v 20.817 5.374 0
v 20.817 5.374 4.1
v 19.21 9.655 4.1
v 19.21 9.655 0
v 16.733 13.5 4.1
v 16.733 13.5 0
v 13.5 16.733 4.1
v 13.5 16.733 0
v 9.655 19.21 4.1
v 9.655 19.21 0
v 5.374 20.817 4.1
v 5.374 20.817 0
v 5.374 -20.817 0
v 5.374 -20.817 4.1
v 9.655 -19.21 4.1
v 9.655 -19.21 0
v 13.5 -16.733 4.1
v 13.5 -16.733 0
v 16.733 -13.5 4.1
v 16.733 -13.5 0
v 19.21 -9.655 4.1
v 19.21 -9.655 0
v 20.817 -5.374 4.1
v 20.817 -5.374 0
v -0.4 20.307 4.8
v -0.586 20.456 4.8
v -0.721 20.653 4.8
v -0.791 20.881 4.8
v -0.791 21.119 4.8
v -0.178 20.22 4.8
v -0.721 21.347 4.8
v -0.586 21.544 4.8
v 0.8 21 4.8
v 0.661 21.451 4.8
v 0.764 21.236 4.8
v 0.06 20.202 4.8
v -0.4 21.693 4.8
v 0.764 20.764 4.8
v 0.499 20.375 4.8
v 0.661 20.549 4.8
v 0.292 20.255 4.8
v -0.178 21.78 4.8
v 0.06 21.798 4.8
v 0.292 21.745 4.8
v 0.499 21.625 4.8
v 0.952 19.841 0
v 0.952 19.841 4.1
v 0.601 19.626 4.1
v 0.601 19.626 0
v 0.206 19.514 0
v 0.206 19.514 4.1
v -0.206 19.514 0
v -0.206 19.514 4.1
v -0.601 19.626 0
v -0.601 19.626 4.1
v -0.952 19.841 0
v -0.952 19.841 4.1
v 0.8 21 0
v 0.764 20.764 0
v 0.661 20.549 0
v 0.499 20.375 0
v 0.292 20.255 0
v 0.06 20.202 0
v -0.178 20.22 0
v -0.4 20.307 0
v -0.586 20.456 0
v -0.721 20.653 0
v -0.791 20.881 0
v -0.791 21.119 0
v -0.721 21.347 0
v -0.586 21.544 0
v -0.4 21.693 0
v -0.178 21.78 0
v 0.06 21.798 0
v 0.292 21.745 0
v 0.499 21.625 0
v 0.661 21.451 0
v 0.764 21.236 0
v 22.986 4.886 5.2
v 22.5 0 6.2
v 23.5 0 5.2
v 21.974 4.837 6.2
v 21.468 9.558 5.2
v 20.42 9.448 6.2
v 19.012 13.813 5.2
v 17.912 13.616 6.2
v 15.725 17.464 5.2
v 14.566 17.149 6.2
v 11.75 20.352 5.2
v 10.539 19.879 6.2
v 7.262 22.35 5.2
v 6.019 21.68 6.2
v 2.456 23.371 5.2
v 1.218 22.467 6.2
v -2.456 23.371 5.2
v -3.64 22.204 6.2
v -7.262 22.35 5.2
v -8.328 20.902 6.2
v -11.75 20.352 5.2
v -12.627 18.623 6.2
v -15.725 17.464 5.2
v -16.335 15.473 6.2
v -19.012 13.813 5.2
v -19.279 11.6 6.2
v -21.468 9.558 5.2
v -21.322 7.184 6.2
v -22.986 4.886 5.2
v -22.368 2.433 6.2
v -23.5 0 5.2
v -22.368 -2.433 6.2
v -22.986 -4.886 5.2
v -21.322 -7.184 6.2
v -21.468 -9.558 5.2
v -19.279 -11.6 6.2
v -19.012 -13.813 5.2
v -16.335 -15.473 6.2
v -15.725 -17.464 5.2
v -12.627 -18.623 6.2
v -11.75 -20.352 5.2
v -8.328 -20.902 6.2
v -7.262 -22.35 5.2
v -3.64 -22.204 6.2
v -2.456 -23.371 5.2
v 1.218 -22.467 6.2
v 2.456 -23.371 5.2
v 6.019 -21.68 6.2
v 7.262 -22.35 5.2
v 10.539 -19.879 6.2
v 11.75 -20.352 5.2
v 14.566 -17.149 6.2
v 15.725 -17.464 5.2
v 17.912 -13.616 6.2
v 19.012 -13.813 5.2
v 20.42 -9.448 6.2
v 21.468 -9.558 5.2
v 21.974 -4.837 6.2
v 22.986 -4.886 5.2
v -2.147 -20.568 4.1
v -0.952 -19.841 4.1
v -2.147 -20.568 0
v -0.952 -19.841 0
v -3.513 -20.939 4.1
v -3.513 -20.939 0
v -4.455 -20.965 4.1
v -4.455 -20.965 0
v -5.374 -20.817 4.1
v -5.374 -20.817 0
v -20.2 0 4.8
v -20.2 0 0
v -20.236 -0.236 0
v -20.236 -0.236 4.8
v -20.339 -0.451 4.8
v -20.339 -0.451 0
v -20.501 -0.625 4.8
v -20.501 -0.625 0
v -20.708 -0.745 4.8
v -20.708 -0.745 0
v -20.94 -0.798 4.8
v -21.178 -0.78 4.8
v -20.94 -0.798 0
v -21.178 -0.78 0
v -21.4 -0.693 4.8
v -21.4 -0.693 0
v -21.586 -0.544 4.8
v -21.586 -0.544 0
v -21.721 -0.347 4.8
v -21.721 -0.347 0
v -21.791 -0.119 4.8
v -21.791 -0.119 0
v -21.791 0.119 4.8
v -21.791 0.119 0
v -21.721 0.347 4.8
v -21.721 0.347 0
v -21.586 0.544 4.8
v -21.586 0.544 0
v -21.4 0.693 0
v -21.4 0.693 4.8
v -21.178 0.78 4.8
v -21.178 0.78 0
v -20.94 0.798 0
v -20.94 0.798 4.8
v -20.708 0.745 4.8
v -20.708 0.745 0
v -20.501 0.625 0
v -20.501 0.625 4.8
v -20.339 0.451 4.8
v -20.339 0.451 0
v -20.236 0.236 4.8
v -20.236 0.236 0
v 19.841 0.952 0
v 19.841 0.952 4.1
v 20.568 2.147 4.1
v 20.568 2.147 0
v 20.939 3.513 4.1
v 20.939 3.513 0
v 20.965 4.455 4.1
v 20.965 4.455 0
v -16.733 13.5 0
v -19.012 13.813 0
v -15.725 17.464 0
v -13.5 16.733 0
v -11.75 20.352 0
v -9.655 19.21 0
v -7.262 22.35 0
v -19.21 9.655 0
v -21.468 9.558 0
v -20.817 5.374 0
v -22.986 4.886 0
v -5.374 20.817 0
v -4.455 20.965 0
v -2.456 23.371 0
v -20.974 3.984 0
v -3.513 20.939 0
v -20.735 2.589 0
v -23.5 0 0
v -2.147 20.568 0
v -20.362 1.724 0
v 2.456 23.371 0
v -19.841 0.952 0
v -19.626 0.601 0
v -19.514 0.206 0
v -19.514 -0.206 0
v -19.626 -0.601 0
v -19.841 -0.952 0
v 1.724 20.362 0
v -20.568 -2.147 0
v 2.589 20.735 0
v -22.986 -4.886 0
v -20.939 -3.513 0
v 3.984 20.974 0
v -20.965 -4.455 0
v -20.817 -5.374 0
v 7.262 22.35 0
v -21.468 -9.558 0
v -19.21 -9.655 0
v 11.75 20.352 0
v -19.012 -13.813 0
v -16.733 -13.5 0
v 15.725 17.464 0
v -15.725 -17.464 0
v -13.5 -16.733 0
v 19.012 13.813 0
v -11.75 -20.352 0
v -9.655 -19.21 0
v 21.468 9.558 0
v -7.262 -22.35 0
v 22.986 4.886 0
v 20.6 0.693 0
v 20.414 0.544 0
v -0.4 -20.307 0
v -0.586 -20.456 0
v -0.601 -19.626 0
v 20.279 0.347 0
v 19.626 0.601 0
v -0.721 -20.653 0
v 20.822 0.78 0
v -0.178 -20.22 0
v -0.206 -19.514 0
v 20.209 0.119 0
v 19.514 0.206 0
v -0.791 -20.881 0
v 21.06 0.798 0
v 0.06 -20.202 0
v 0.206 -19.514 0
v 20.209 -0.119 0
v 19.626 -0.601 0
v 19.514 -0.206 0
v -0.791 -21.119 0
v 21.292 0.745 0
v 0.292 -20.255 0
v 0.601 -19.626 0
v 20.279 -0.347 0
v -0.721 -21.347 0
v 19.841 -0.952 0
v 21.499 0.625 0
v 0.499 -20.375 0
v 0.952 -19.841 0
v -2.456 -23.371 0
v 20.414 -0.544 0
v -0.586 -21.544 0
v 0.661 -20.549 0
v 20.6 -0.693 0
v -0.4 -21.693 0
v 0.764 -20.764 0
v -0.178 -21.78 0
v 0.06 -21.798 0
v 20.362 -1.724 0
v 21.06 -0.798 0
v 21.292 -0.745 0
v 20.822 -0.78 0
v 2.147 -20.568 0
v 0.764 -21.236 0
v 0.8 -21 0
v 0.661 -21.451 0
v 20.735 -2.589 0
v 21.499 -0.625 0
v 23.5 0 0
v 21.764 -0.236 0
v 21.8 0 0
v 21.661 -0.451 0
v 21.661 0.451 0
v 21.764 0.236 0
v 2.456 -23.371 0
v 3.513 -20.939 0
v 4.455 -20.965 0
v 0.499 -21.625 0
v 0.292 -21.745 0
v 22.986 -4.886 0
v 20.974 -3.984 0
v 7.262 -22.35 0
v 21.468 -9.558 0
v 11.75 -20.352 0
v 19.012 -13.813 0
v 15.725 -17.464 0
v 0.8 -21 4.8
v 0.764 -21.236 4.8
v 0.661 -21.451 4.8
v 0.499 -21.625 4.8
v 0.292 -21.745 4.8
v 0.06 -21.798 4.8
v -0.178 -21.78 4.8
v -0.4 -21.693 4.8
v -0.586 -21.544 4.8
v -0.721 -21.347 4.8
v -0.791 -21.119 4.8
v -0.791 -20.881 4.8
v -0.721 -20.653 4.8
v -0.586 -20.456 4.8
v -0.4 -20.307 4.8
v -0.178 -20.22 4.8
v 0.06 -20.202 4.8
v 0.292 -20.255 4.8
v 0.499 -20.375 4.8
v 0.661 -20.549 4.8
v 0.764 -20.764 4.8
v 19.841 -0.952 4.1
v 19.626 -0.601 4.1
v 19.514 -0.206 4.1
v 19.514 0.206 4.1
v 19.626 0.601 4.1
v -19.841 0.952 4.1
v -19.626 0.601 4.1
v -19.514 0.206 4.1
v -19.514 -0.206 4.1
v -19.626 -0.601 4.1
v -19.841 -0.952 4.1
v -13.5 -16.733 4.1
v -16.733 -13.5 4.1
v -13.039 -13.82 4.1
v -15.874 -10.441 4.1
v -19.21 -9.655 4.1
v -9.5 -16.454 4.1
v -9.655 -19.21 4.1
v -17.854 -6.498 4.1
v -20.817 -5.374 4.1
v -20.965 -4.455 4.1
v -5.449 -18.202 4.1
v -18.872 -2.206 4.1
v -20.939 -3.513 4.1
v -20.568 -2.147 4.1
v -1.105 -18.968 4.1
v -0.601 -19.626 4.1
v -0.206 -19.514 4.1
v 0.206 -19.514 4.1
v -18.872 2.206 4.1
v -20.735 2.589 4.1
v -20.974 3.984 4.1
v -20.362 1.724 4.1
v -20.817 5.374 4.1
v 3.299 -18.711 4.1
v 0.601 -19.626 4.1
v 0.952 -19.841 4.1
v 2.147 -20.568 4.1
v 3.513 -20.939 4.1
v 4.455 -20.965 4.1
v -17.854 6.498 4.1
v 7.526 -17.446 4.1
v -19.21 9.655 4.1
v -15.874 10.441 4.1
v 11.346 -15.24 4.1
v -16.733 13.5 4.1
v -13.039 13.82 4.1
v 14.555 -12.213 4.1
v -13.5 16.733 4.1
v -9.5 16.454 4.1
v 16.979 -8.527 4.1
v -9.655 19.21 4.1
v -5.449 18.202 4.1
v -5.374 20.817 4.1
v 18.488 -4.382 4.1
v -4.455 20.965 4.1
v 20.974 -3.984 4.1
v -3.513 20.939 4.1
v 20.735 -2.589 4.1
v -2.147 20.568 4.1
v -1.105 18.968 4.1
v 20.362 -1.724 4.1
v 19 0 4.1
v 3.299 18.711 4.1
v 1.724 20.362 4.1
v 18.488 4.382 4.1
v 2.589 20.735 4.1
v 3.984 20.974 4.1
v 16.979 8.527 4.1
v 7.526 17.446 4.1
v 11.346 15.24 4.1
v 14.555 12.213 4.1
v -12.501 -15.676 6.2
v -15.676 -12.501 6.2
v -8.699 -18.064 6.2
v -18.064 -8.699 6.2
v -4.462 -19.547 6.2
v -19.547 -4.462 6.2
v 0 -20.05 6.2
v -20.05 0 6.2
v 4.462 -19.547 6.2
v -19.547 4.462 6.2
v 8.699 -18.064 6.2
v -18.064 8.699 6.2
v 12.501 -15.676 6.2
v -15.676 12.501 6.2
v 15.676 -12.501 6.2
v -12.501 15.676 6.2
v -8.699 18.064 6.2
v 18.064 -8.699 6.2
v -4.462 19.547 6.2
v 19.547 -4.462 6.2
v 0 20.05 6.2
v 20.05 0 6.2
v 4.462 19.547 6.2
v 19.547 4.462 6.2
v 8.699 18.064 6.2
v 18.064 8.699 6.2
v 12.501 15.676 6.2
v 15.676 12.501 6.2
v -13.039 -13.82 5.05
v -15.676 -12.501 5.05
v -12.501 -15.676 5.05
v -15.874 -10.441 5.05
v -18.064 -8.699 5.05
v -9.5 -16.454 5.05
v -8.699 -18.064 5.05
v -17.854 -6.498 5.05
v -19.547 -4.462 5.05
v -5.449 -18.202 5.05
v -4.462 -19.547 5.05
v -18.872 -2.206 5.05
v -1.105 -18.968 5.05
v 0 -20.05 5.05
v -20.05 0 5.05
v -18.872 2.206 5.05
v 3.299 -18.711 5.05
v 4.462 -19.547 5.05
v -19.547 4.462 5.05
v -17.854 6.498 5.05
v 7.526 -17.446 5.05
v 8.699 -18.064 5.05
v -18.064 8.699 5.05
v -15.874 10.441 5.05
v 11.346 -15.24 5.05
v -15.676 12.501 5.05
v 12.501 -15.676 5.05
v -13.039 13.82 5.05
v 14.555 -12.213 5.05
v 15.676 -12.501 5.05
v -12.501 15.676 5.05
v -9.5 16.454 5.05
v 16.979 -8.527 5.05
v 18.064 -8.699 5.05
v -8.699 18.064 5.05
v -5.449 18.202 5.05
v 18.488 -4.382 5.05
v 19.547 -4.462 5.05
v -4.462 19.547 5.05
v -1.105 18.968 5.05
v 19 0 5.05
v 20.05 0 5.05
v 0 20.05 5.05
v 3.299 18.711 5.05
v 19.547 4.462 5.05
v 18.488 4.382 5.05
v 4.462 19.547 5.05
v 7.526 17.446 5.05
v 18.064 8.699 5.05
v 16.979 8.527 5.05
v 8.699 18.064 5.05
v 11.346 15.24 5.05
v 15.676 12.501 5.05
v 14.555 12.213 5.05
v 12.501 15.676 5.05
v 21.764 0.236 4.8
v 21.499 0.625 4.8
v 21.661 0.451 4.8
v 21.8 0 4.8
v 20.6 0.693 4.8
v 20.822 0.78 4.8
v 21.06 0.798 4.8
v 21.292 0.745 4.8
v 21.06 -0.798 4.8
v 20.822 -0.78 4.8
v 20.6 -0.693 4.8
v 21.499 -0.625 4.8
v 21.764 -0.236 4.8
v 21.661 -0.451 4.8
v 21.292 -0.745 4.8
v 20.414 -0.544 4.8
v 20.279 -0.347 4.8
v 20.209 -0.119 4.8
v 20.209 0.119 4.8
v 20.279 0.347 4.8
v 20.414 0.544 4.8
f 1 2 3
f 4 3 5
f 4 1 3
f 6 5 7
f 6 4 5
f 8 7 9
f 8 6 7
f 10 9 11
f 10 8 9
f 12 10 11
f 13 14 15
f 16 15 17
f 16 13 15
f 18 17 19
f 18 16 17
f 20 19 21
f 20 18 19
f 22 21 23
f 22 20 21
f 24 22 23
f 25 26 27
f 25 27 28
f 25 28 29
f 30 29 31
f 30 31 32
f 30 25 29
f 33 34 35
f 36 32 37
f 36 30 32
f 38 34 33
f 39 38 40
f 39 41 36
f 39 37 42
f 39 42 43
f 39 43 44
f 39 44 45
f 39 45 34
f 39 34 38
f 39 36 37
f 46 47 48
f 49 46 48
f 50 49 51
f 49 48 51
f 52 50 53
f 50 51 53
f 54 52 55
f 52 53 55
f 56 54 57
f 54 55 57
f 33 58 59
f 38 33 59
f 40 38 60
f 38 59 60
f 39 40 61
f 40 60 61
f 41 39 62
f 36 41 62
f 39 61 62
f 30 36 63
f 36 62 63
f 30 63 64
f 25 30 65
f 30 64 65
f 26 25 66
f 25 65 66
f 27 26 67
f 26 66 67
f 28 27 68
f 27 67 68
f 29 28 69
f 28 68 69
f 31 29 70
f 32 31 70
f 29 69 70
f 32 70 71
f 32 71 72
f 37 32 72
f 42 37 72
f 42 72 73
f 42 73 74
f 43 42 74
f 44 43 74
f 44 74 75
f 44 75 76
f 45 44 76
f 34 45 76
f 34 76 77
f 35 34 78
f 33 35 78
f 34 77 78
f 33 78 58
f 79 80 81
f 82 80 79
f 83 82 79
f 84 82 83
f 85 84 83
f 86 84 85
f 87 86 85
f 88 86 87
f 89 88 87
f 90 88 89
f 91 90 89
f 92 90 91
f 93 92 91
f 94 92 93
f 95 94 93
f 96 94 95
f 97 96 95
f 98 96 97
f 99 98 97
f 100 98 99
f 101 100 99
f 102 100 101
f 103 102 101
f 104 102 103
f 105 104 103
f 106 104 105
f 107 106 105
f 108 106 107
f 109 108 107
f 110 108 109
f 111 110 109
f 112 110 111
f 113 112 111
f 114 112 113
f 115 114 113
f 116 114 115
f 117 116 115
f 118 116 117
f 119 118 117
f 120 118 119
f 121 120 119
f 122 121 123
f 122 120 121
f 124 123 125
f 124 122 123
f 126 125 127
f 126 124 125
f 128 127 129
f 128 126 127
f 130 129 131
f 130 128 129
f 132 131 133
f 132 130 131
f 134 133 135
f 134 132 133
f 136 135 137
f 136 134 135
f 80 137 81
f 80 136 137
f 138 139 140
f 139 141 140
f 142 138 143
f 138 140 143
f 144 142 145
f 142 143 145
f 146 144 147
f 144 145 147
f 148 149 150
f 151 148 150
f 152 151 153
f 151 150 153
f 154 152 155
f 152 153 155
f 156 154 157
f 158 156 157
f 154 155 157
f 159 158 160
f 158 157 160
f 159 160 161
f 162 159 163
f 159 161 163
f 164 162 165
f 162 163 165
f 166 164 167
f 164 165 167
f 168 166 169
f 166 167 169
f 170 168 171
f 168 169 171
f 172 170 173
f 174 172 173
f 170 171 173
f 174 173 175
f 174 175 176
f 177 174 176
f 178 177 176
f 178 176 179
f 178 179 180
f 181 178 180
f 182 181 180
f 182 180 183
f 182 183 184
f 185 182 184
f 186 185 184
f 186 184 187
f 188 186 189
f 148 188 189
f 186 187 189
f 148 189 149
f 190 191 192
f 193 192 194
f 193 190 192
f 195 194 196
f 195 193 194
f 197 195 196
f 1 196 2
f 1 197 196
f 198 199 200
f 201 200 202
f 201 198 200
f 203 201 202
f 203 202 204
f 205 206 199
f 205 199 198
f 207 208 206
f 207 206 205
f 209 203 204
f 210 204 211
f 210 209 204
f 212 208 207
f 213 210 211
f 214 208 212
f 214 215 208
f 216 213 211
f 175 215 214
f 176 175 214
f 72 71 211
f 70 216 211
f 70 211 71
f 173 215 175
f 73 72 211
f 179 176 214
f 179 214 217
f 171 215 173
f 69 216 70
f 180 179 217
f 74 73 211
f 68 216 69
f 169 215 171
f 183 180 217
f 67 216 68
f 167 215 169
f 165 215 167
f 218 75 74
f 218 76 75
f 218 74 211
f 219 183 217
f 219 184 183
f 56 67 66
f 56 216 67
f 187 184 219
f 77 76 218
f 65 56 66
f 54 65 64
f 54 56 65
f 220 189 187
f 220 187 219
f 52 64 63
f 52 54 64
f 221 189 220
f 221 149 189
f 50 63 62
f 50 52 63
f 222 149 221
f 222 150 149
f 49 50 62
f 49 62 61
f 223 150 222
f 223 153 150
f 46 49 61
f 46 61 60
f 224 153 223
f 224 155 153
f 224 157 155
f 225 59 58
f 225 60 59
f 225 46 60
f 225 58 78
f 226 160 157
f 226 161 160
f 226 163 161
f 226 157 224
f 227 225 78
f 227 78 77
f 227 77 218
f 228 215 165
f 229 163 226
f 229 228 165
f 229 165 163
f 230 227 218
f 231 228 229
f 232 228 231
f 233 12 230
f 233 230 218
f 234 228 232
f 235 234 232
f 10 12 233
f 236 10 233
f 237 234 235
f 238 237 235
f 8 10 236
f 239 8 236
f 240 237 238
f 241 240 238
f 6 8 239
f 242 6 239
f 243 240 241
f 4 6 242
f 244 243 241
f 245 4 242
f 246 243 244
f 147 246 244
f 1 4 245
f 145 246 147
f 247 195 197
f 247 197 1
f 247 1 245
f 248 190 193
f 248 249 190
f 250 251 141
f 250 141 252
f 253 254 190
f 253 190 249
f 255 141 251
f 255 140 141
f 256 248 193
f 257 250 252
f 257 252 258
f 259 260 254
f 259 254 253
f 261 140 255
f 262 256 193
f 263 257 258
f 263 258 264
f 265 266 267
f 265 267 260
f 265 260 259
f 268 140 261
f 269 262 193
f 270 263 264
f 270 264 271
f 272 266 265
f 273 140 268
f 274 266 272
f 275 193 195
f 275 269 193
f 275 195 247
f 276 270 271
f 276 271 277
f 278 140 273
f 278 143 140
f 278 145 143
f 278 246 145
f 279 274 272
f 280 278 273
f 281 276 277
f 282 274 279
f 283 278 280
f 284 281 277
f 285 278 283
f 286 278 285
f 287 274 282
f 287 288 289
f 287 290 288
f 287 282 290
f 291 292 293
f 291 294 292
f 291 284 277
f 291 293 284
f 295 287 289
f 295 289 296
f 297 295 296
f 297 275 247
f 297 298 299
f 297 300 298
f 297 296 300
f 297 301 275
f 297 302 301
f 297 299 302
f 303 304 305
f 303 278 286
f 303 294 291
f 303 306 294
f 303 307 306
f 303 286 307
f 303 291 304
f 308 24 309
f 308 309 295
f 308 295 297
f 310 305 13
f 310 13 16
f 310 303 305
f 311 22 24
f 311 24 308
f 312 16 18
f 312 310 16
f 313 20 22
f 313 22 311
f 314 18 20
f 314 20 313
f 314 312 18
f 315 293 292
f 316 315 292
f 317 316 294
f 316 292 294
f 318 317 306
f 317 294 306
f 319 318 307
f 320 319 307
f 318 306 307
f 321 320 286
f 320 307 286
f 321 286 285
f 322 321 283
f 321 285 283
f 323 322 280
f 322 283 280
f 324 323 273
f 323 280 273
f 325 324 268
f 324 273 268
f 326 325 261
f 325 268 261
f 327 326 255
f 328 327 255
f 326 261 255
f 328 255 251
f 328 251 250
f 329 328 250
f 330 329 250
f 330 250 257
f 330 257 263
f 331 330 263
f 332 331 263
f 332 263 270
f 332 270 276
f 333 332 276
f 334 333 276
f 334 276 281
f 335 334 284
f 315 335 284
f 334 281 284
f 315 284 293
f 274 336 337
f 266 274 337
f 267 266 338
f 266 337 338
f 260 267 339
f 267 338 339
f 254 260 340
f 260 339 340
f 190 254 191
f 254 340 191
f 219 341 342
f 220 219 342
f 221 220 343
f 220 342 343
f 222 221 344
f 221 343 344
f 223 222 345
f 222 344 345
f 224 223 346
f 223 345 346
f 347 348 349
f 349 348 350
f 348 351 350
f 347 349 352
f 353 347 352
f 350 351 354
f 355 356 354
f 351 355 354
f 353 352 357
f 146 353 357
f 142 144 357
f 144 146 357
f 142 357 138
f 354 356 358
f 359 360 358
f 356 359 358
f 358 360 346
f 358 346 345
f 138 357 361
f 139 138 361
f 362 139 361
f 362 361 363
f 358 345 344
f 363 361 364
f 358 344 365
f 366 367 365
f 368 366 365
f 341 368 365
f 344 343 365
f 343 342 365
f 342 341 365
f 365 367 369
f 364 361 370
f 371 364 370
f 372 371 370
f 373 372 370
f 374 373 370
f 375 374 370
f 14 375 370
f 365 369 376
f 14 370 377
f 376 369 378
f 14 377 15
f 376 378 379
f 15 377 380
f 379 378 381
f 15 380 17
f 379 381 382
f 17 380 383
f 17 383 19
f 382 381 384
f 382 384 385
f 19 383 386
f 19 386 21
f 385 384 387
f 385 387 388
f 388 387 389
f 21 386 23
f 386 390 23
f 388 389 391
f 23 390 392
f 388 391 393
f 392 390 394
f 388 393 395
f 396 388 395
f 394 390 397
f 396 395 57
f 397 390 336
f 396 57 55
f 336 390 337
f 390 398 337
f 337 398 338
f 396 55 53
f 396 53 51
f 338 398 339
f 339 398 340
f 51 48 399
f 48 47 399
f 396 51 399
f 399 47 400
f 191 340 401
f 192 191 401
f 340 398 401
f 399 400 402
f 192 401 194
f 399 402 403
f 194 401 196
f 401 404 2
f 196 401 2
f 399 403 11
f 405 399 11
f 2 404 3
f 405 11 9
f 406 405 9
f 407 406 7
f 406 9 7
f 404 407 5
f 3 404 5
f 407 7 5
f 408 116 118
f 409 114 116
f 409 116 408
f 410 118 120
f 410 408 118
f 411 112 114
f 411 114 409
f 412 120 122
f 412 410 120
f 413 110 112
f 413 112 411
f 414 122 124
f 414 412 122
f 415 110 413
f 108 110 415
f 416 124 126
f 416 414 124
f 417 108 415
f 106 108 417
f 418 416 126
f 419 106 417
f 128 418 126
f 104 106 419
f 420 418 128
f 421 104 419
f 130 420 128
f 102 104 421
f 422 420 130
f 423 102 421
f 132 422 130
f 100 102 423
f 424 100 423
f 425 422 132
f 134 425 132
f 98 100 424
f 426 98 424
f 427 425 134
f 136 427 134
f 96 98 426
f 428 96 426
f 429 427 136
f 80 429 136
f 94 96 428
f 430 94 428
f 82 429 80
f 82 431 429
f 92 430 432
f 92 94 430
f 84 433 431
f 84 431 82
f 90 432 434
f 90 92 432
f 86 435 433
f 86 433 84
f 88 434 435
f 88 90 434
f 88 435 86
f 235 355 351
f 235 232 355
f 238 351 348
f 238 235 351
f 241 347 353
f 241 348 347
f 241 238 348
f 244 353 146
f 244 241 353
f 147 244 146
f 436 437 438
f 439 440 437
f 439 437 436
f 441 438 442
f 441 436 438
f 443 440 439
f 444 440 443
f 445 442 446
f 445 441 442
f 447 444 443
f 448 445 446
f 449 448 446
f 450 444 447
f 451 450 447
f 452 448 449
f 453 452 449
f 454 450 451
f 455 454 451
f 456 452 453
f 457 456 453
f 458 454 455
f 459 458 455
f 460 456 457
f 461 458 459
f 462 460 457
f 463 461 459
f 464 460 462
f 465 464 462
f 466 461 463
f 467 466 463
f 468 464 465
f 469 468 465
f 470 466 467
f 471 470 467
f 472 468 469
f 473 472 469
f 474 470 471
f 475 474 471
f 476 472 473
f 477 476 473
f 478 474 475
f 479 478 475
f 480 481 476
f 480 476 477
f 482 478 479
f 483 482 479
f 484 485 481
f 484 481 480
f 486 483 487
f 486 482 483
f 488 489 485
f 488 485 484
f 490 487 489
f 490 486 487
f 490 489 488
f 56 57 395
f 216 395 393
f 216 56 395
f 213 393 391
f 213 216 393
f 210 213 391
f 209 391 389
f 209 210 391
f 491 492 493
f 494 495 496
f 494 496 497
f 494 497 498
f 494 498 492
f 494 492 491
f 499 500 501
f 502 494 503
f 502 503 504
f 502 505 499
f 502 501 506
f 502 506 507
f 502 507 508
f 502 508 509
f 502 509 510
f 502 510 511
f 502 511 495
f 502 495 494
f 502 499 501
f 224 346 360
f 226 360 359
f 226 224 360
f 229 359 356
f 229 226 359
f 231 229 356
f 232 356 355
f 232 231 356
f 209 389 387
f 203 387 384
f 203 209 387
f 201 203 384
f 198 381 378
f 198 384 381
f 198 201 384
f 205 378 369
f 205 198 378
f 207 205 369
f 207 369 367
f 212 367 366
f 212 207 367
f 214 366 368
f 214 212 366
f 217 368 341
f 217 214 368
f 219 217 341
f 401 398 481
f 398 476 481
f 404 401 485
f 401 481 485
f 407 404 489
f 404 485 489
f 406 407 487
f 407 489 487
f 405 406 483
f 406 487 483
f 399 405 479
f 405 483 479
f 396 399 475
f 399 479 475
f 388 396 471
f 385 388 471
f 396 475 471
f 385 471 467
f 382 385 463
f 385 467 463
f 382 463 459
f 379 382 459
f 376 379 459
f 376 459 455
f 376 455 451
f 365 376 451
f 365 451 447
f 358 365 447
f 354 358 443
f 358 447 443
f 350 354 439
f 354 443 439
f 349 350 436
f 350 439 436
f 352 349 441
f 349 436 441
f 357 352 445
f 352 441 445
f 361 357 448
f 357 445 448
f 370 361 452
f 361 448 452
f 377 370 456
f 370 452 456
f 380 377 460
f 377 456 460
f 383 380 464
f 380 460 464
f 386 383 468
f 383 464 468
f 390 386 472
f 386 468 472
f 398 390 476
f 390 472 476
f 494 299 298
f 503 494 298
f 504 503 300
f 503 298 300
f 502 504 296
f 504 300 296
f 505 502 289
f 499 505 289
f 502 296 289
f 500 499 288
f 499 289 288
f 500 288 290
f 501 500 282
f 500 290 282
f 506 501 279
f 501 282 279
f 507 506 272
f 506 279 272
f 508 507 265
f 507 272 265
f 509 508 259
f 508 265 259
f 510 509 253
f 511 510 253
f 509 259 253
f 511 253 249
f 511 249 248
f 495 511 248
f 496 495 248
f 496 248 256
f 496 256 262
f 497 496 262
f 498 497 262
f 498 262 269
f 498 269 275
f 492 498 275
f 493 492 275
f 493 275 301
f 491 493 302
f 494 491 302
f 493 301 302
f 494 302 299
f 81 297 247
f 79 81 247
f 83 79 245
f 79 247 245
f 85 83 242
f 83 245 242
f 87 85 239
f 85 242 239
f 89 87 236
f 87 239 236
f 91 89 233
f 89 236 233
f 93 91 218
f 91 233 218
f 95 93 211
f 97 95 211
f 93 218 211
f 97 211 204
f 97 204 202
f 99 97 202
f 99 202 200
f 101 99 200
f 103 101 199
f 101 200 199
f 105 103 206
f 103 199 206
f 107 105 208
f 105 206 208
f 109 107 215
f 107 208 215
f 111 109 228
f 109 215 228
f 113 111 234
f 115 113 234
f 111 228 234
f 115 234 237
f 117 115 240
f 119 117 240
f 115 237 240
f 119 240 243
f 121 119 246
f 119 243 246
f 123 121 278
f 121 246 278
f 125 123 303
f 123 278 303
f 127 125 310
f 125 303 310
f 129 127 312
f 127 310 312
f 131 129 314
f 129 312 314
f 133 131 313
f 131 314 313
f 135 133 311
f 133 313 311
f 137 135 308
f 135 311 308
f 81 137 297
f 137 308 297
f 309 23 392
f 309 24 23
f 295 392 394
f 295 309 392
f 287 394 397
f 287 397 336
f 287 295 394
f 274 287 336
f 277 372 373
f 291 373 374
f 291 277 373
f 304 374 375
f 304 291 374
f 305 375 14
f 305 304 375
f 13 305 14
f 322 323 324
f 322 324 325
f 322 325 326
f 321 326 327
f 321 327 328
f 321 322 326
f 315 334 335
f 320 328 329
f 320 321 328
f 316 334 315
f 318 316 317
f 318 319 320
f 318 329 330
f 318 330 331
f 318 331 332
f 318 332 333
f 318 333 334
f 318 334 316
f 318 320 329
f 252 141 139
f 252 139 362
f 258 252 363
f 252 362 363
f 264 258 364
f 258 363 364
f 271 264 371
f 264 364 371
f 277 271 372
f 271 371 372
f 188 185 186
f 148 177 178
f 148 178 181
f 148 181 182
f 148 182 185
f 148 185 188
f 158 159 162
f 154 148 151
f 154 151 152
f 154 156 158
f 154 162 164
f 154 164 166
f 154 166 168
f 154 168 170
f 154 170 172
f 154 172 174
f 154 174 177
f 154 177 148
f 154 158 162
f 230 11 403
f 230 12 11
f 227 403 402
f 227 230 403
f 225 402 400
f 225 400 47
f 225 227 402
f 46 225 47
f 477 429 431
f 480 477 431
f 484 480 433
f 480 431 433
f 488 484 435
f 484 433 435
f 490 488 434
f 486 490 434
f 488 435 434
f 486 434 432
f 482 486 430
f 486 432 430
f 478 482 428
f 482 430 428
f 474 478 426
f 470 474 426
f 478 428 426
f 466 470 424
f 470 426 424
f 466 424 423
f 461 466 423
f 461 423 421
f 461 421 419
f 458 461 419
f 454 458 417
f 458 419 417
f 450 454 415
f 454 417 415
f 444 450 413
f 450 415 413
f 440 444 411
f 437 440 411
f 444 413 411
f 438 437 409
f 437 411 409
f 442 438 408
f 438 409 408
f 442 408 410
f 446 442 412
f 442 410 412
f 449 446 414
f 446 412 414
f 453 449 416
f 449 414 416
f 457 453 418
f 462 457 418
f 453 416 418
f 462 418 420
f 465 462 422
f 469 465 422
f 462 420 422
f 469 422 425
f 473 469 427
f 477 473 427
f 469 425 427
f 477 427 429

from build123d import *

# Parameters (mm, degrees)
F0_R      = 23.5
F1_DEPTH  = 6.2
F2_T      = -2
F3_SIZE   = 1
F4_R      = 19
F5_DEPTH  = 6.201
F6_R      = 20.05
F7_DEPTH  = 1.15
F8_DEPTH  = 0.1
F9_R      = 1.5
F10_DEPTH = 4.1
F11_R     = 5
F12_R     = 0.8
F13_DEPTH = 4.8


with BuildPart() as f1:
    # F0 (on Top) → F1 (new body)
    with BuildSketch(Plane.XY):
        Circle(F0_R)
    extrude(amount=F1_DEPTH)

    # F2
    f2_openings = [f1.faces().sort_by_distance(p)[0] for p in [
        (0, 0, 0),
    ]]
    offset(amount=F2_T, openings=f2_openings)

    # F3
    f3_edges = [f1.edges().sort_by_distance(p)[0] for p in [
        (-23.5, 0, 6.2),
    ]]
    chamfer(f3_edges, length=F3_SIZE)

    # F4 (on face) → F5 (cut, through all)
    with BuildSketch(Plane.XY.offset(6.2)):
        Circle(F4_R)
    extrude(amount=-F5_DEPTH, mode=Mode.SUBTRACT)

    # F6 (on face) → F7 (cut)
    with BuildSketch(Plane.XY.offset(6.2)):
        Circle(F6_R)
    extrude(amount=-F7_DEPTH, mode=Mode.SUBTRACT)

    # F8 (add): a face of the model
    f8_faces = [f1.faces().sort_by_distance(p)[0] for p in [
        (-20.8918881682, 0, 4.2),
    ]]
    extrude(f8_faces, amount=F8_DEPTH)

    # F9 (on face) → F10 (join, through all)
    with BuildSketch(Plane(origin=(0, 0, 4.1), x_dir=(1, 0, 0), z_dir=(0, 0, -1))):
        with Locations((0, 21)):
            Circle(F9_R)
        with Locations((-21, 0)):
            Circle(F9_R)
        with Locations((0, -21)):
            Circle(F9_R)
        with Locations((21, 0)):
            Circle(F9_R)
    extrude(amount=F10_DEPTH)

    # F11
    f11_edges = [f1.edges().sort_by_distance(p)[0] for p in [
        (21.452381, -1.430158, 2.05),
        (21.452381, 1.430158, 2.05),
        (-1.430158, -21.452381, 2.05),
        (1.430158, -21.452381, 2.05),
        (-21.452381, 1.430158, 2.05),
        (-21.452381, -1.430158, 2.05),
        (-1.430158, 21.452381, 2.05),
        (1.430158, 21.452381, 2.05),
    ]]
    fillet(f11_edges, radius=F11_R)

    # F12 (on face) → F13 (cut)
    with BuildSketch(Plane(origin=(0, 0, 0), x_dir=(1, 0, 0), z_dir=(0, 0, -1))):
        with Locations((0, -21)):
            Circle(F12_R)
        with Locations((21, 0)):
            Circle(F12_R)
        with Locations((0, 21)):
            Circle(F12_R)
        with Locations((-21, 0)):
            Circle(F12_R)
    extrude(amount=-F13_DEPTH, mode=Mode.SUBTRACT)


solid = f1.part
